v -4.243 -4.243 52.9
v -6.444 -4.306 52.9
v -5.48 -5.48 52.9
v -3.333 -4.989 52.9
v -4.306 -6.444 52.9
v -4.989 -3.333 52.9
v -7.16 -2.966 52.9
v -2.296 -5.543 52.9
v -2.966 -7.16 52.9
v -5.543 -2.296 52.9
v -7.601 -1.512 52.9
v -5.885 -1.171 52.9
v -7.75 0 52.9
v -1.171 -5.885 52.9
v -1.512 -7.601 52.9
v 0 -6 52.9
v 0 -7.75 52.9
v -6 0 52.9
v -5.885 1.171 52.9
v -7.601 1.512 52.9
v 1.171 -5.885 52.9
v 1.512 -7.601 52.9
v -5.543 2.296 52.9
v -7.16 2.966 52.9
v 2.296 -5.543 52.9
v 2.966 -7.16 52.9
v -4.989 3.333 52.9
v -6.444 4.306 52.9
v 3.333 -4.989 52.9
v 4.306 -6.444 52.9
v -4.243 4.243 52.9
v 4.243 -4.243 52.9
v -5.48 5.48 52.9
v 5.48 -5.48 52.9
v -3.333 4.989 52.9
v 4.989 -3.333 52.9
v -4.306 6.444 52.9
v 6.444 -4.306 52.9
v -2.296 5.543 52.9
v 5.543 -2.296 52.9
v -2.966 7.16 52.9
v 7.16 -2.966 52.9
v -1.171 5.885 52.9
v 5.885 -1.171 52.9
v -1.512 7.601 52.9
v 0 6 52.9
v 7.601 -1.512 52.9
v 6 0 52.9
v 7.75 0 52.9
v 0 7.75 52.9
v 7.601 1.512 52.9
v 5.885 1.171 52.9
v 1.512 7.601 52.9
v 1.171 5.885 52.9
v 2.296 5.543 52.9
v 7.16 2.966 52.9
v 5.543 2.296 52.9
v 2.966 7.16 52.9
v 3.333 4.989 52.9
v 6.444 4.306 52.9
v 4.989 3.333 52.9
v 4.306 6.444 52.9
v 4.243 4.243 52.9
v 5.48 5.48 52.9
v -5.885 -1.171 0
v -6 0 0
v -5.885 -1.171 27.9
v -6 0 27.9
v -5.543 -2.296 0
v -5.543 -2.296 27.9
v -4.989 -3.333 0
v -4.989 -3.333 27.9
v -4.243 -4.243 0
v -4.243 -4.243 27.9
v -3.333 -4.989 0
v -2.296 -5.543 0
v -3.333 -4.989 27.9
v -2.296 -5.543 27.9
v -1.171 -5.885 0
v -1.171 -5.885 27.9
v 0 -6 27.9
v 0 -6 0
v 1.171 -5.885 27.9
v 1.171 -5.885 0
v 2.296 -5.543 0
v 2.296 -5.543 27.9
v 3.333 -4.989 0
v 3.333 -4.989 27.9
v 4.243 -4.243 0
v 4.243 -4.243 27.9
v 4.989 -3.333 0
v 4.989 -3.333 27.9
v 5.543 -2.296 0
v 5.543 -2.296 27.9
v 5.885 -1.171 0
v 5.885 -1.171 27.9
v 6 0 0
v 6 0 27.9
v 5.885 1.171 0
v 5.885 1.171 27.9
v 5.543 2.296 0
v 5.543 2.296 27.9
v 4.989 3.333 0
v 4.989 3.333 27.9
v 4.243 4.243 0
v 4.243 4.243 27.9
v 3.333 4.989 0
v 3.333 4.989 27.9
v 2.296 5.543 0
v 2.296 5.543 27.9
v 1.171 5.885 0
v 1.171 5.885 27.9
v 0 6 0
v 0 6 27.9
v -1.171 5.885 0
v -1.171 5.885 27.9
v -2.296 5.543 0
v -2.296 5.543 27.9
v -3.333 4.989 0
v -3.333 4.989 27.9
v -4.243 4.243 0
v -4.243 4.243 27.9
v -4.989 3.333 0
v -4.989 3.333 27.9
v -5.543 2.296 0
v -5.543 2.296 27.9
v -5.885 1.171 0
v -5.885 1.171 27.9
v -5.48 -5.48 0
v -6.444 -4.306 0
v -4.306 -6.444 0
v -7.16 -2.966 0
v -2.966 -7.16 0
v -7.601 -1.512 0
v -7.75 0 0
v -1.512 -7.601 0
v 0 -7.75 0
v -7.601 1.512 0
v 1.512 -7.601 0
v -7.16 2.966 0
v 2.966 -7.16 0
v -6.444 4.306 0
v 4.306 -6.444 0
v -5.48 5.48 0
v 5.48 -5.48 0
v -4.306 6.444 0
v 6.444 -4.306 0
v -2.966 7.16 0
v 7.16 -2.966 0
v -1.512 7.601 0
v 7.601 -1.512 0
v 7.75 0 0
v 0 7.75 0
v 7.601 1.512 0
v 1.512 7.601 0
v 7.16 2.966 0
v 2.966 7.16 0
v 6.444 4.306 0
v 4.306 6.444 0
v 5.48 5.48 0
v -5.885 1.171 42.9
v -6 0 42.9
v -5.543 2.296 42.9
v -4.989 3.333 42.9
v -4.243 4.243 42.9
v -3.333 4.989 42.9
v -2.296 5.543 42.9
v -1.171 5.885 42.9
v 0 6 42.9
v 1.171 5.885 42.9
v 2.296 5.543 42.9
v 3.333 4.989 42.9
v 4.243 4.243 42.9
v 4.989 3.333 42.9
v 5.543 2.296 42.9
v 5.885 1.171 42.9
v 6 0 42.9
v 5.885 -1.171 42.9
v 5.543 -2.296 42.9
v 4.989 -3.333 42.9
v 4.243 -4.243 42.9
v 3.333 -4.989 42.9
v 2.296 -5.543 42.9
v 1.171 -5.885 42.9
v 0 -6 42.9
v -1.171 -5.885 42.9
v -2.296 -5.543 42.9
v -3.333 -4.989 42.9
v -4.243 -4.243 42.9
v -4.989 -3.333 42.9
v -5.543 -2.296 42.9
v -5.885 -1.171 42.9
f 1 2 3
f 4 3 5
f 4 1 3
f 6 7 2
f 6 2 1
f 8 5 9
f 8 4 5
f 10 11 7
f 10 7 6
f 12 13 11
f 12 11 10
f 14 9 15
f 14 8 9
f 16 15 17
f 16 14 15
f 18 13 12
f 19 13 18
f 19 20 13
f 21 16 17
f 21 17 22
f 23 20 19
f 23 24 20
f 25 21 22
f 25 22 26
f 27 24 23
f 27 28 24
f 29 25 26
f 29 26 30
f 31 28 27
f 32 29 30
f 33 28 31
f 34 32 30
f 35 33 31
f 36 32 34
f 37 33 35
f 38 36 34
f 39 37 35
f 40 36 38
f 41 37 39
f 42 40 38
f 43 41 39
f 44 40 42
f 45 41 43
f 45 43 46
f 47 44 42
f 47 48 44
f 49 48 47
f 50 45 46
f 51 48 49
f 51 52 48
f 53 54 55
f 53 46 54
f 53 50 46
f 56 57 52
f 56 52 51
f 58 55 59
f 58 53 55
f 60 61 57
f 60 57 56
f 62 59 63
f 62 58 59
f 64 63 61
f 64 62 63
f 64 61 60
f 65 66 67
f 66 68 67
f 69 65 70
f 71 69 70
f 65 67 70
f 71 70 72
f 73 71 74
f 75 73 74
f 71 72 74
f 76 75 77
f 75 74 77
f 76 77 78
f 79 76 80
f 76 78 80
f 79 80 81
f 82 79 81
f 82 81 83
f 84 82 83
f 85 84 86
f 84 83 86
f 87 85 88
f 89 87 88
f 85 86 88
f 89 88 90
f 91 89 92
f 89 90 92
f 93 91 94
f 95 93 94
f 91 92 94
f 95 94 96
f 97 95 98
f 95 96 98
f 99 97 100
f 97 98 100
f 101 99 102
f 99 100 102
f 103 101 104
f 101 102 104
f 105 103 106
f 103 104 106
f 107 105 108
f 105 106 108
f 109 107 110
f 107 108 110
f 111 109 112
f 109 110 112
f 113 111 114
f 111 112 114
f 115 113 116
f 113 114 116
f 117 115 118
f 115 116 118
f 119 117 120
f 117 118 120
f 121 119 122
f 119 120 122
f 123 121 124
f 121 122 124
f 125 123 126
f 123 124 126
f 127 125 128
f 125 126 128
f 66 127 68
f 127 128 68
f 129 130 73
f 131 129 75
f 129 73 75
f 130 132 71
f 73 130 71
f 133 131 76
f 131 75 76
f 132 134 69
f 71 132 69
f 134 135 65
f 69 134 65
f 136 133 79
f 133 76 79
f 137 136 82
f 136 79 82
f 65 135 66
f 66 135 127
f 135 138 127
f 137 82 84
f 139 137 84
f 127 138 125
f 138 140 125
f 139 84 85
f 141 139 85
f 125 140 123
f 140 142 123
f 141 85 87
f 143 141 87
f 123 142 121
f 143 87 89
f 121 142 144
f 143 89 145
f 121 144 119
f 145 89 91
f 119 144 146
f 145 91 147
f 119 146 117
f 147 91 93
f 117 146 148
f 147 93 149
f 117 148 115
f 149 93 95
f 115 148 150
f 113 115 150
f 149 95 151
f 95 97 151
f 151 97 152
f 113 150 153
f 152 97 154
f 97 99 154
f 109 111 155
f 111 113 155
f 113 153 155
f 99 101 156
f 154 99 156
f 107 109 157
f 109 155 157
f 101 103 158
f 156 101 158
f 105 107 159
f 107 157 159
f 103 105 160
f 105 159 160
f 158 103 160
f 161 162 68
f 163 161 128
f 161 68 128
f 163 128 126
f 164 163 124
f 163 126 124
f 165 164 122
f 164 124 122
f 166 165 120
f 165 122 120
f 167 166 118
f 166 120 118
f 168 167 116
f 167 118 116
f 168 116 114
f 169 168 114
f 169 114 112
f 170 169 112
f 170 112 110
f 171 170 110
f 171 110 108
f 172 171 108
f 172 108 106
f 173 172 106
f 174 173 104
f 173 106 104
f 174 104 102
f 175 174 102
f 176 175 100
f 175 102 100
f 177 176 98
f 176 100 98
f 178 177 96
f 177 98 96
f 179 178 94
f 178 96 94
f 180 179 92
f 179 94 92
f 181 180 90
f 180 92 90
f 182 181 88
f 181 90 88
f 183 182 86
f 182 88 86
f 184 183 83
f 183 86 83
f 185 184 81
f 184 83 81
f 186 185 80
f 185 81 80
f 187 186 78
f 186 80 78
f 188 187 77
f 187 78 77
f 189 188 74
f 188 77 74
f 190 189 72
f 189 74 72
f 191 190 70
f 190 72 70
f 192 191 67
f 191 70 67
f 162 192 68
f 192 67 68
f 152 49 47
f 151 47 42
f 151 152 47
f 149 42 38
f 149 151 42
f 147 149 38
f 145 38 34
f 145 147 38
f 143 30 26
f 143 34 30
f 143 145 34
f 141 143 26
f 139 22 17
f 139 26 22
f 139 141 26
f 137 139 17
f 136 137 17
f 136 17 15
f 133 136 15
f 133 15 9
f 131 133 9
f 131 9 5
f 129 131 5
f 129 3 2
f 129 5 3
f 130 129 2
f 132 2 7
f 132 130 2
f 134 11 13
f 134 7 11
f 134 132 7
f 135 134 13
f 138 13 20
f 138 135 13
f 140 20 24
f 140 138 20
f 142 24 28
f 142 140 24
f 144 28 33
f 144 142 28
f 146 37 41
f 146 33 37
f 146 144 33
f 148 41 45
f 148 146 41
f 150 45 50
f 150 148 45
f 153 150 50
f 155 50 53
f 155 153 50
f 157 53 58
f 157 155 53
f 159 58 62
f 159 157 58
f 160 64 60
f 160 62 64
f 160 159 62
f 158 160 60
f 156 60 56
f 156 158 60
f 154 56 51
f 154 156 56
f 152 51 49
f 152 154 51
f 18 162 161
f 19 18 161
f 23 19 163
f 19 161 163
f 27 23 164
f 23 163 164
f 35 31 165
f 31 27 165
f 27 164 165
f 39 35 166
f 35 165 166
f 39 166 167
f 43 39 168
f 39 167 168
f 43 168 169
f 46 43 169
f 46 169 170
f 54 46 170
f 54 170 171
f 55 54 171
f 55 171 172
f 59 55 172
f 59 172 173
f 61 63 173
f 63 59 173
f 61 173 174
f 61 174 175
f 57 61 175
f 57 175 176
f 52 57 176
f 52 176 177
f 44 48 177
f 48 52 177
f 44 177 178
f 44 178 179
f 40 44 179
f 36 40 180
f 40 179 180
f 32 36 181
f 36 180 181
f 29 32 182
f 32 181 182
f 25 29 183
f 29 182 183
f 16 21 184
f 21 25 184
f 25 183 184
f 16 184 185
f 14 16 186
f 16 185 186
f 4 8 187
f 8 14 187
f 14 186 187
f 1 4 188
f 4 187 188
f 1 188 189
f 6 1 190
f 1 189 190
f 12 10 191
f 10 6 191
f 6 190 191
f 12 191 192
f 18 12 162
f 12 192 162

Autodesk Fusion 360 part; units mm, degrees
sketch "Sketch1" plane through (0, 0, 0) normal (0, 0, 1) x (1, 0, 0)
  circle A0 centre (0, 0) radius 7.75
  dimension "d1" = 15.5
extrude "Extrude1" add sketch "Sketch1" along normal blind 27.9
sketch "Sketch2" plane through (0, 0, 27.9) normal (0, 0, 1) x (-1, 0, 0)
  circle A0 centre (0, 0) radius 7.75
  circle A1 centre (0, 0) radius 6
  dimension "d4" = 12
extrude "Extrude2" cut sketch "Sketch2" against normal blind 30 contours A1
extrude "Extrude3" add 1 faces at (7.1155, -0.6831, 27.9) along direction (0, 0, 1) blind 15
extrude "Extrude4" add 1 faces at (7.1155, -0.6831, 42.9) along direction (0, 0, 1) blind 10
